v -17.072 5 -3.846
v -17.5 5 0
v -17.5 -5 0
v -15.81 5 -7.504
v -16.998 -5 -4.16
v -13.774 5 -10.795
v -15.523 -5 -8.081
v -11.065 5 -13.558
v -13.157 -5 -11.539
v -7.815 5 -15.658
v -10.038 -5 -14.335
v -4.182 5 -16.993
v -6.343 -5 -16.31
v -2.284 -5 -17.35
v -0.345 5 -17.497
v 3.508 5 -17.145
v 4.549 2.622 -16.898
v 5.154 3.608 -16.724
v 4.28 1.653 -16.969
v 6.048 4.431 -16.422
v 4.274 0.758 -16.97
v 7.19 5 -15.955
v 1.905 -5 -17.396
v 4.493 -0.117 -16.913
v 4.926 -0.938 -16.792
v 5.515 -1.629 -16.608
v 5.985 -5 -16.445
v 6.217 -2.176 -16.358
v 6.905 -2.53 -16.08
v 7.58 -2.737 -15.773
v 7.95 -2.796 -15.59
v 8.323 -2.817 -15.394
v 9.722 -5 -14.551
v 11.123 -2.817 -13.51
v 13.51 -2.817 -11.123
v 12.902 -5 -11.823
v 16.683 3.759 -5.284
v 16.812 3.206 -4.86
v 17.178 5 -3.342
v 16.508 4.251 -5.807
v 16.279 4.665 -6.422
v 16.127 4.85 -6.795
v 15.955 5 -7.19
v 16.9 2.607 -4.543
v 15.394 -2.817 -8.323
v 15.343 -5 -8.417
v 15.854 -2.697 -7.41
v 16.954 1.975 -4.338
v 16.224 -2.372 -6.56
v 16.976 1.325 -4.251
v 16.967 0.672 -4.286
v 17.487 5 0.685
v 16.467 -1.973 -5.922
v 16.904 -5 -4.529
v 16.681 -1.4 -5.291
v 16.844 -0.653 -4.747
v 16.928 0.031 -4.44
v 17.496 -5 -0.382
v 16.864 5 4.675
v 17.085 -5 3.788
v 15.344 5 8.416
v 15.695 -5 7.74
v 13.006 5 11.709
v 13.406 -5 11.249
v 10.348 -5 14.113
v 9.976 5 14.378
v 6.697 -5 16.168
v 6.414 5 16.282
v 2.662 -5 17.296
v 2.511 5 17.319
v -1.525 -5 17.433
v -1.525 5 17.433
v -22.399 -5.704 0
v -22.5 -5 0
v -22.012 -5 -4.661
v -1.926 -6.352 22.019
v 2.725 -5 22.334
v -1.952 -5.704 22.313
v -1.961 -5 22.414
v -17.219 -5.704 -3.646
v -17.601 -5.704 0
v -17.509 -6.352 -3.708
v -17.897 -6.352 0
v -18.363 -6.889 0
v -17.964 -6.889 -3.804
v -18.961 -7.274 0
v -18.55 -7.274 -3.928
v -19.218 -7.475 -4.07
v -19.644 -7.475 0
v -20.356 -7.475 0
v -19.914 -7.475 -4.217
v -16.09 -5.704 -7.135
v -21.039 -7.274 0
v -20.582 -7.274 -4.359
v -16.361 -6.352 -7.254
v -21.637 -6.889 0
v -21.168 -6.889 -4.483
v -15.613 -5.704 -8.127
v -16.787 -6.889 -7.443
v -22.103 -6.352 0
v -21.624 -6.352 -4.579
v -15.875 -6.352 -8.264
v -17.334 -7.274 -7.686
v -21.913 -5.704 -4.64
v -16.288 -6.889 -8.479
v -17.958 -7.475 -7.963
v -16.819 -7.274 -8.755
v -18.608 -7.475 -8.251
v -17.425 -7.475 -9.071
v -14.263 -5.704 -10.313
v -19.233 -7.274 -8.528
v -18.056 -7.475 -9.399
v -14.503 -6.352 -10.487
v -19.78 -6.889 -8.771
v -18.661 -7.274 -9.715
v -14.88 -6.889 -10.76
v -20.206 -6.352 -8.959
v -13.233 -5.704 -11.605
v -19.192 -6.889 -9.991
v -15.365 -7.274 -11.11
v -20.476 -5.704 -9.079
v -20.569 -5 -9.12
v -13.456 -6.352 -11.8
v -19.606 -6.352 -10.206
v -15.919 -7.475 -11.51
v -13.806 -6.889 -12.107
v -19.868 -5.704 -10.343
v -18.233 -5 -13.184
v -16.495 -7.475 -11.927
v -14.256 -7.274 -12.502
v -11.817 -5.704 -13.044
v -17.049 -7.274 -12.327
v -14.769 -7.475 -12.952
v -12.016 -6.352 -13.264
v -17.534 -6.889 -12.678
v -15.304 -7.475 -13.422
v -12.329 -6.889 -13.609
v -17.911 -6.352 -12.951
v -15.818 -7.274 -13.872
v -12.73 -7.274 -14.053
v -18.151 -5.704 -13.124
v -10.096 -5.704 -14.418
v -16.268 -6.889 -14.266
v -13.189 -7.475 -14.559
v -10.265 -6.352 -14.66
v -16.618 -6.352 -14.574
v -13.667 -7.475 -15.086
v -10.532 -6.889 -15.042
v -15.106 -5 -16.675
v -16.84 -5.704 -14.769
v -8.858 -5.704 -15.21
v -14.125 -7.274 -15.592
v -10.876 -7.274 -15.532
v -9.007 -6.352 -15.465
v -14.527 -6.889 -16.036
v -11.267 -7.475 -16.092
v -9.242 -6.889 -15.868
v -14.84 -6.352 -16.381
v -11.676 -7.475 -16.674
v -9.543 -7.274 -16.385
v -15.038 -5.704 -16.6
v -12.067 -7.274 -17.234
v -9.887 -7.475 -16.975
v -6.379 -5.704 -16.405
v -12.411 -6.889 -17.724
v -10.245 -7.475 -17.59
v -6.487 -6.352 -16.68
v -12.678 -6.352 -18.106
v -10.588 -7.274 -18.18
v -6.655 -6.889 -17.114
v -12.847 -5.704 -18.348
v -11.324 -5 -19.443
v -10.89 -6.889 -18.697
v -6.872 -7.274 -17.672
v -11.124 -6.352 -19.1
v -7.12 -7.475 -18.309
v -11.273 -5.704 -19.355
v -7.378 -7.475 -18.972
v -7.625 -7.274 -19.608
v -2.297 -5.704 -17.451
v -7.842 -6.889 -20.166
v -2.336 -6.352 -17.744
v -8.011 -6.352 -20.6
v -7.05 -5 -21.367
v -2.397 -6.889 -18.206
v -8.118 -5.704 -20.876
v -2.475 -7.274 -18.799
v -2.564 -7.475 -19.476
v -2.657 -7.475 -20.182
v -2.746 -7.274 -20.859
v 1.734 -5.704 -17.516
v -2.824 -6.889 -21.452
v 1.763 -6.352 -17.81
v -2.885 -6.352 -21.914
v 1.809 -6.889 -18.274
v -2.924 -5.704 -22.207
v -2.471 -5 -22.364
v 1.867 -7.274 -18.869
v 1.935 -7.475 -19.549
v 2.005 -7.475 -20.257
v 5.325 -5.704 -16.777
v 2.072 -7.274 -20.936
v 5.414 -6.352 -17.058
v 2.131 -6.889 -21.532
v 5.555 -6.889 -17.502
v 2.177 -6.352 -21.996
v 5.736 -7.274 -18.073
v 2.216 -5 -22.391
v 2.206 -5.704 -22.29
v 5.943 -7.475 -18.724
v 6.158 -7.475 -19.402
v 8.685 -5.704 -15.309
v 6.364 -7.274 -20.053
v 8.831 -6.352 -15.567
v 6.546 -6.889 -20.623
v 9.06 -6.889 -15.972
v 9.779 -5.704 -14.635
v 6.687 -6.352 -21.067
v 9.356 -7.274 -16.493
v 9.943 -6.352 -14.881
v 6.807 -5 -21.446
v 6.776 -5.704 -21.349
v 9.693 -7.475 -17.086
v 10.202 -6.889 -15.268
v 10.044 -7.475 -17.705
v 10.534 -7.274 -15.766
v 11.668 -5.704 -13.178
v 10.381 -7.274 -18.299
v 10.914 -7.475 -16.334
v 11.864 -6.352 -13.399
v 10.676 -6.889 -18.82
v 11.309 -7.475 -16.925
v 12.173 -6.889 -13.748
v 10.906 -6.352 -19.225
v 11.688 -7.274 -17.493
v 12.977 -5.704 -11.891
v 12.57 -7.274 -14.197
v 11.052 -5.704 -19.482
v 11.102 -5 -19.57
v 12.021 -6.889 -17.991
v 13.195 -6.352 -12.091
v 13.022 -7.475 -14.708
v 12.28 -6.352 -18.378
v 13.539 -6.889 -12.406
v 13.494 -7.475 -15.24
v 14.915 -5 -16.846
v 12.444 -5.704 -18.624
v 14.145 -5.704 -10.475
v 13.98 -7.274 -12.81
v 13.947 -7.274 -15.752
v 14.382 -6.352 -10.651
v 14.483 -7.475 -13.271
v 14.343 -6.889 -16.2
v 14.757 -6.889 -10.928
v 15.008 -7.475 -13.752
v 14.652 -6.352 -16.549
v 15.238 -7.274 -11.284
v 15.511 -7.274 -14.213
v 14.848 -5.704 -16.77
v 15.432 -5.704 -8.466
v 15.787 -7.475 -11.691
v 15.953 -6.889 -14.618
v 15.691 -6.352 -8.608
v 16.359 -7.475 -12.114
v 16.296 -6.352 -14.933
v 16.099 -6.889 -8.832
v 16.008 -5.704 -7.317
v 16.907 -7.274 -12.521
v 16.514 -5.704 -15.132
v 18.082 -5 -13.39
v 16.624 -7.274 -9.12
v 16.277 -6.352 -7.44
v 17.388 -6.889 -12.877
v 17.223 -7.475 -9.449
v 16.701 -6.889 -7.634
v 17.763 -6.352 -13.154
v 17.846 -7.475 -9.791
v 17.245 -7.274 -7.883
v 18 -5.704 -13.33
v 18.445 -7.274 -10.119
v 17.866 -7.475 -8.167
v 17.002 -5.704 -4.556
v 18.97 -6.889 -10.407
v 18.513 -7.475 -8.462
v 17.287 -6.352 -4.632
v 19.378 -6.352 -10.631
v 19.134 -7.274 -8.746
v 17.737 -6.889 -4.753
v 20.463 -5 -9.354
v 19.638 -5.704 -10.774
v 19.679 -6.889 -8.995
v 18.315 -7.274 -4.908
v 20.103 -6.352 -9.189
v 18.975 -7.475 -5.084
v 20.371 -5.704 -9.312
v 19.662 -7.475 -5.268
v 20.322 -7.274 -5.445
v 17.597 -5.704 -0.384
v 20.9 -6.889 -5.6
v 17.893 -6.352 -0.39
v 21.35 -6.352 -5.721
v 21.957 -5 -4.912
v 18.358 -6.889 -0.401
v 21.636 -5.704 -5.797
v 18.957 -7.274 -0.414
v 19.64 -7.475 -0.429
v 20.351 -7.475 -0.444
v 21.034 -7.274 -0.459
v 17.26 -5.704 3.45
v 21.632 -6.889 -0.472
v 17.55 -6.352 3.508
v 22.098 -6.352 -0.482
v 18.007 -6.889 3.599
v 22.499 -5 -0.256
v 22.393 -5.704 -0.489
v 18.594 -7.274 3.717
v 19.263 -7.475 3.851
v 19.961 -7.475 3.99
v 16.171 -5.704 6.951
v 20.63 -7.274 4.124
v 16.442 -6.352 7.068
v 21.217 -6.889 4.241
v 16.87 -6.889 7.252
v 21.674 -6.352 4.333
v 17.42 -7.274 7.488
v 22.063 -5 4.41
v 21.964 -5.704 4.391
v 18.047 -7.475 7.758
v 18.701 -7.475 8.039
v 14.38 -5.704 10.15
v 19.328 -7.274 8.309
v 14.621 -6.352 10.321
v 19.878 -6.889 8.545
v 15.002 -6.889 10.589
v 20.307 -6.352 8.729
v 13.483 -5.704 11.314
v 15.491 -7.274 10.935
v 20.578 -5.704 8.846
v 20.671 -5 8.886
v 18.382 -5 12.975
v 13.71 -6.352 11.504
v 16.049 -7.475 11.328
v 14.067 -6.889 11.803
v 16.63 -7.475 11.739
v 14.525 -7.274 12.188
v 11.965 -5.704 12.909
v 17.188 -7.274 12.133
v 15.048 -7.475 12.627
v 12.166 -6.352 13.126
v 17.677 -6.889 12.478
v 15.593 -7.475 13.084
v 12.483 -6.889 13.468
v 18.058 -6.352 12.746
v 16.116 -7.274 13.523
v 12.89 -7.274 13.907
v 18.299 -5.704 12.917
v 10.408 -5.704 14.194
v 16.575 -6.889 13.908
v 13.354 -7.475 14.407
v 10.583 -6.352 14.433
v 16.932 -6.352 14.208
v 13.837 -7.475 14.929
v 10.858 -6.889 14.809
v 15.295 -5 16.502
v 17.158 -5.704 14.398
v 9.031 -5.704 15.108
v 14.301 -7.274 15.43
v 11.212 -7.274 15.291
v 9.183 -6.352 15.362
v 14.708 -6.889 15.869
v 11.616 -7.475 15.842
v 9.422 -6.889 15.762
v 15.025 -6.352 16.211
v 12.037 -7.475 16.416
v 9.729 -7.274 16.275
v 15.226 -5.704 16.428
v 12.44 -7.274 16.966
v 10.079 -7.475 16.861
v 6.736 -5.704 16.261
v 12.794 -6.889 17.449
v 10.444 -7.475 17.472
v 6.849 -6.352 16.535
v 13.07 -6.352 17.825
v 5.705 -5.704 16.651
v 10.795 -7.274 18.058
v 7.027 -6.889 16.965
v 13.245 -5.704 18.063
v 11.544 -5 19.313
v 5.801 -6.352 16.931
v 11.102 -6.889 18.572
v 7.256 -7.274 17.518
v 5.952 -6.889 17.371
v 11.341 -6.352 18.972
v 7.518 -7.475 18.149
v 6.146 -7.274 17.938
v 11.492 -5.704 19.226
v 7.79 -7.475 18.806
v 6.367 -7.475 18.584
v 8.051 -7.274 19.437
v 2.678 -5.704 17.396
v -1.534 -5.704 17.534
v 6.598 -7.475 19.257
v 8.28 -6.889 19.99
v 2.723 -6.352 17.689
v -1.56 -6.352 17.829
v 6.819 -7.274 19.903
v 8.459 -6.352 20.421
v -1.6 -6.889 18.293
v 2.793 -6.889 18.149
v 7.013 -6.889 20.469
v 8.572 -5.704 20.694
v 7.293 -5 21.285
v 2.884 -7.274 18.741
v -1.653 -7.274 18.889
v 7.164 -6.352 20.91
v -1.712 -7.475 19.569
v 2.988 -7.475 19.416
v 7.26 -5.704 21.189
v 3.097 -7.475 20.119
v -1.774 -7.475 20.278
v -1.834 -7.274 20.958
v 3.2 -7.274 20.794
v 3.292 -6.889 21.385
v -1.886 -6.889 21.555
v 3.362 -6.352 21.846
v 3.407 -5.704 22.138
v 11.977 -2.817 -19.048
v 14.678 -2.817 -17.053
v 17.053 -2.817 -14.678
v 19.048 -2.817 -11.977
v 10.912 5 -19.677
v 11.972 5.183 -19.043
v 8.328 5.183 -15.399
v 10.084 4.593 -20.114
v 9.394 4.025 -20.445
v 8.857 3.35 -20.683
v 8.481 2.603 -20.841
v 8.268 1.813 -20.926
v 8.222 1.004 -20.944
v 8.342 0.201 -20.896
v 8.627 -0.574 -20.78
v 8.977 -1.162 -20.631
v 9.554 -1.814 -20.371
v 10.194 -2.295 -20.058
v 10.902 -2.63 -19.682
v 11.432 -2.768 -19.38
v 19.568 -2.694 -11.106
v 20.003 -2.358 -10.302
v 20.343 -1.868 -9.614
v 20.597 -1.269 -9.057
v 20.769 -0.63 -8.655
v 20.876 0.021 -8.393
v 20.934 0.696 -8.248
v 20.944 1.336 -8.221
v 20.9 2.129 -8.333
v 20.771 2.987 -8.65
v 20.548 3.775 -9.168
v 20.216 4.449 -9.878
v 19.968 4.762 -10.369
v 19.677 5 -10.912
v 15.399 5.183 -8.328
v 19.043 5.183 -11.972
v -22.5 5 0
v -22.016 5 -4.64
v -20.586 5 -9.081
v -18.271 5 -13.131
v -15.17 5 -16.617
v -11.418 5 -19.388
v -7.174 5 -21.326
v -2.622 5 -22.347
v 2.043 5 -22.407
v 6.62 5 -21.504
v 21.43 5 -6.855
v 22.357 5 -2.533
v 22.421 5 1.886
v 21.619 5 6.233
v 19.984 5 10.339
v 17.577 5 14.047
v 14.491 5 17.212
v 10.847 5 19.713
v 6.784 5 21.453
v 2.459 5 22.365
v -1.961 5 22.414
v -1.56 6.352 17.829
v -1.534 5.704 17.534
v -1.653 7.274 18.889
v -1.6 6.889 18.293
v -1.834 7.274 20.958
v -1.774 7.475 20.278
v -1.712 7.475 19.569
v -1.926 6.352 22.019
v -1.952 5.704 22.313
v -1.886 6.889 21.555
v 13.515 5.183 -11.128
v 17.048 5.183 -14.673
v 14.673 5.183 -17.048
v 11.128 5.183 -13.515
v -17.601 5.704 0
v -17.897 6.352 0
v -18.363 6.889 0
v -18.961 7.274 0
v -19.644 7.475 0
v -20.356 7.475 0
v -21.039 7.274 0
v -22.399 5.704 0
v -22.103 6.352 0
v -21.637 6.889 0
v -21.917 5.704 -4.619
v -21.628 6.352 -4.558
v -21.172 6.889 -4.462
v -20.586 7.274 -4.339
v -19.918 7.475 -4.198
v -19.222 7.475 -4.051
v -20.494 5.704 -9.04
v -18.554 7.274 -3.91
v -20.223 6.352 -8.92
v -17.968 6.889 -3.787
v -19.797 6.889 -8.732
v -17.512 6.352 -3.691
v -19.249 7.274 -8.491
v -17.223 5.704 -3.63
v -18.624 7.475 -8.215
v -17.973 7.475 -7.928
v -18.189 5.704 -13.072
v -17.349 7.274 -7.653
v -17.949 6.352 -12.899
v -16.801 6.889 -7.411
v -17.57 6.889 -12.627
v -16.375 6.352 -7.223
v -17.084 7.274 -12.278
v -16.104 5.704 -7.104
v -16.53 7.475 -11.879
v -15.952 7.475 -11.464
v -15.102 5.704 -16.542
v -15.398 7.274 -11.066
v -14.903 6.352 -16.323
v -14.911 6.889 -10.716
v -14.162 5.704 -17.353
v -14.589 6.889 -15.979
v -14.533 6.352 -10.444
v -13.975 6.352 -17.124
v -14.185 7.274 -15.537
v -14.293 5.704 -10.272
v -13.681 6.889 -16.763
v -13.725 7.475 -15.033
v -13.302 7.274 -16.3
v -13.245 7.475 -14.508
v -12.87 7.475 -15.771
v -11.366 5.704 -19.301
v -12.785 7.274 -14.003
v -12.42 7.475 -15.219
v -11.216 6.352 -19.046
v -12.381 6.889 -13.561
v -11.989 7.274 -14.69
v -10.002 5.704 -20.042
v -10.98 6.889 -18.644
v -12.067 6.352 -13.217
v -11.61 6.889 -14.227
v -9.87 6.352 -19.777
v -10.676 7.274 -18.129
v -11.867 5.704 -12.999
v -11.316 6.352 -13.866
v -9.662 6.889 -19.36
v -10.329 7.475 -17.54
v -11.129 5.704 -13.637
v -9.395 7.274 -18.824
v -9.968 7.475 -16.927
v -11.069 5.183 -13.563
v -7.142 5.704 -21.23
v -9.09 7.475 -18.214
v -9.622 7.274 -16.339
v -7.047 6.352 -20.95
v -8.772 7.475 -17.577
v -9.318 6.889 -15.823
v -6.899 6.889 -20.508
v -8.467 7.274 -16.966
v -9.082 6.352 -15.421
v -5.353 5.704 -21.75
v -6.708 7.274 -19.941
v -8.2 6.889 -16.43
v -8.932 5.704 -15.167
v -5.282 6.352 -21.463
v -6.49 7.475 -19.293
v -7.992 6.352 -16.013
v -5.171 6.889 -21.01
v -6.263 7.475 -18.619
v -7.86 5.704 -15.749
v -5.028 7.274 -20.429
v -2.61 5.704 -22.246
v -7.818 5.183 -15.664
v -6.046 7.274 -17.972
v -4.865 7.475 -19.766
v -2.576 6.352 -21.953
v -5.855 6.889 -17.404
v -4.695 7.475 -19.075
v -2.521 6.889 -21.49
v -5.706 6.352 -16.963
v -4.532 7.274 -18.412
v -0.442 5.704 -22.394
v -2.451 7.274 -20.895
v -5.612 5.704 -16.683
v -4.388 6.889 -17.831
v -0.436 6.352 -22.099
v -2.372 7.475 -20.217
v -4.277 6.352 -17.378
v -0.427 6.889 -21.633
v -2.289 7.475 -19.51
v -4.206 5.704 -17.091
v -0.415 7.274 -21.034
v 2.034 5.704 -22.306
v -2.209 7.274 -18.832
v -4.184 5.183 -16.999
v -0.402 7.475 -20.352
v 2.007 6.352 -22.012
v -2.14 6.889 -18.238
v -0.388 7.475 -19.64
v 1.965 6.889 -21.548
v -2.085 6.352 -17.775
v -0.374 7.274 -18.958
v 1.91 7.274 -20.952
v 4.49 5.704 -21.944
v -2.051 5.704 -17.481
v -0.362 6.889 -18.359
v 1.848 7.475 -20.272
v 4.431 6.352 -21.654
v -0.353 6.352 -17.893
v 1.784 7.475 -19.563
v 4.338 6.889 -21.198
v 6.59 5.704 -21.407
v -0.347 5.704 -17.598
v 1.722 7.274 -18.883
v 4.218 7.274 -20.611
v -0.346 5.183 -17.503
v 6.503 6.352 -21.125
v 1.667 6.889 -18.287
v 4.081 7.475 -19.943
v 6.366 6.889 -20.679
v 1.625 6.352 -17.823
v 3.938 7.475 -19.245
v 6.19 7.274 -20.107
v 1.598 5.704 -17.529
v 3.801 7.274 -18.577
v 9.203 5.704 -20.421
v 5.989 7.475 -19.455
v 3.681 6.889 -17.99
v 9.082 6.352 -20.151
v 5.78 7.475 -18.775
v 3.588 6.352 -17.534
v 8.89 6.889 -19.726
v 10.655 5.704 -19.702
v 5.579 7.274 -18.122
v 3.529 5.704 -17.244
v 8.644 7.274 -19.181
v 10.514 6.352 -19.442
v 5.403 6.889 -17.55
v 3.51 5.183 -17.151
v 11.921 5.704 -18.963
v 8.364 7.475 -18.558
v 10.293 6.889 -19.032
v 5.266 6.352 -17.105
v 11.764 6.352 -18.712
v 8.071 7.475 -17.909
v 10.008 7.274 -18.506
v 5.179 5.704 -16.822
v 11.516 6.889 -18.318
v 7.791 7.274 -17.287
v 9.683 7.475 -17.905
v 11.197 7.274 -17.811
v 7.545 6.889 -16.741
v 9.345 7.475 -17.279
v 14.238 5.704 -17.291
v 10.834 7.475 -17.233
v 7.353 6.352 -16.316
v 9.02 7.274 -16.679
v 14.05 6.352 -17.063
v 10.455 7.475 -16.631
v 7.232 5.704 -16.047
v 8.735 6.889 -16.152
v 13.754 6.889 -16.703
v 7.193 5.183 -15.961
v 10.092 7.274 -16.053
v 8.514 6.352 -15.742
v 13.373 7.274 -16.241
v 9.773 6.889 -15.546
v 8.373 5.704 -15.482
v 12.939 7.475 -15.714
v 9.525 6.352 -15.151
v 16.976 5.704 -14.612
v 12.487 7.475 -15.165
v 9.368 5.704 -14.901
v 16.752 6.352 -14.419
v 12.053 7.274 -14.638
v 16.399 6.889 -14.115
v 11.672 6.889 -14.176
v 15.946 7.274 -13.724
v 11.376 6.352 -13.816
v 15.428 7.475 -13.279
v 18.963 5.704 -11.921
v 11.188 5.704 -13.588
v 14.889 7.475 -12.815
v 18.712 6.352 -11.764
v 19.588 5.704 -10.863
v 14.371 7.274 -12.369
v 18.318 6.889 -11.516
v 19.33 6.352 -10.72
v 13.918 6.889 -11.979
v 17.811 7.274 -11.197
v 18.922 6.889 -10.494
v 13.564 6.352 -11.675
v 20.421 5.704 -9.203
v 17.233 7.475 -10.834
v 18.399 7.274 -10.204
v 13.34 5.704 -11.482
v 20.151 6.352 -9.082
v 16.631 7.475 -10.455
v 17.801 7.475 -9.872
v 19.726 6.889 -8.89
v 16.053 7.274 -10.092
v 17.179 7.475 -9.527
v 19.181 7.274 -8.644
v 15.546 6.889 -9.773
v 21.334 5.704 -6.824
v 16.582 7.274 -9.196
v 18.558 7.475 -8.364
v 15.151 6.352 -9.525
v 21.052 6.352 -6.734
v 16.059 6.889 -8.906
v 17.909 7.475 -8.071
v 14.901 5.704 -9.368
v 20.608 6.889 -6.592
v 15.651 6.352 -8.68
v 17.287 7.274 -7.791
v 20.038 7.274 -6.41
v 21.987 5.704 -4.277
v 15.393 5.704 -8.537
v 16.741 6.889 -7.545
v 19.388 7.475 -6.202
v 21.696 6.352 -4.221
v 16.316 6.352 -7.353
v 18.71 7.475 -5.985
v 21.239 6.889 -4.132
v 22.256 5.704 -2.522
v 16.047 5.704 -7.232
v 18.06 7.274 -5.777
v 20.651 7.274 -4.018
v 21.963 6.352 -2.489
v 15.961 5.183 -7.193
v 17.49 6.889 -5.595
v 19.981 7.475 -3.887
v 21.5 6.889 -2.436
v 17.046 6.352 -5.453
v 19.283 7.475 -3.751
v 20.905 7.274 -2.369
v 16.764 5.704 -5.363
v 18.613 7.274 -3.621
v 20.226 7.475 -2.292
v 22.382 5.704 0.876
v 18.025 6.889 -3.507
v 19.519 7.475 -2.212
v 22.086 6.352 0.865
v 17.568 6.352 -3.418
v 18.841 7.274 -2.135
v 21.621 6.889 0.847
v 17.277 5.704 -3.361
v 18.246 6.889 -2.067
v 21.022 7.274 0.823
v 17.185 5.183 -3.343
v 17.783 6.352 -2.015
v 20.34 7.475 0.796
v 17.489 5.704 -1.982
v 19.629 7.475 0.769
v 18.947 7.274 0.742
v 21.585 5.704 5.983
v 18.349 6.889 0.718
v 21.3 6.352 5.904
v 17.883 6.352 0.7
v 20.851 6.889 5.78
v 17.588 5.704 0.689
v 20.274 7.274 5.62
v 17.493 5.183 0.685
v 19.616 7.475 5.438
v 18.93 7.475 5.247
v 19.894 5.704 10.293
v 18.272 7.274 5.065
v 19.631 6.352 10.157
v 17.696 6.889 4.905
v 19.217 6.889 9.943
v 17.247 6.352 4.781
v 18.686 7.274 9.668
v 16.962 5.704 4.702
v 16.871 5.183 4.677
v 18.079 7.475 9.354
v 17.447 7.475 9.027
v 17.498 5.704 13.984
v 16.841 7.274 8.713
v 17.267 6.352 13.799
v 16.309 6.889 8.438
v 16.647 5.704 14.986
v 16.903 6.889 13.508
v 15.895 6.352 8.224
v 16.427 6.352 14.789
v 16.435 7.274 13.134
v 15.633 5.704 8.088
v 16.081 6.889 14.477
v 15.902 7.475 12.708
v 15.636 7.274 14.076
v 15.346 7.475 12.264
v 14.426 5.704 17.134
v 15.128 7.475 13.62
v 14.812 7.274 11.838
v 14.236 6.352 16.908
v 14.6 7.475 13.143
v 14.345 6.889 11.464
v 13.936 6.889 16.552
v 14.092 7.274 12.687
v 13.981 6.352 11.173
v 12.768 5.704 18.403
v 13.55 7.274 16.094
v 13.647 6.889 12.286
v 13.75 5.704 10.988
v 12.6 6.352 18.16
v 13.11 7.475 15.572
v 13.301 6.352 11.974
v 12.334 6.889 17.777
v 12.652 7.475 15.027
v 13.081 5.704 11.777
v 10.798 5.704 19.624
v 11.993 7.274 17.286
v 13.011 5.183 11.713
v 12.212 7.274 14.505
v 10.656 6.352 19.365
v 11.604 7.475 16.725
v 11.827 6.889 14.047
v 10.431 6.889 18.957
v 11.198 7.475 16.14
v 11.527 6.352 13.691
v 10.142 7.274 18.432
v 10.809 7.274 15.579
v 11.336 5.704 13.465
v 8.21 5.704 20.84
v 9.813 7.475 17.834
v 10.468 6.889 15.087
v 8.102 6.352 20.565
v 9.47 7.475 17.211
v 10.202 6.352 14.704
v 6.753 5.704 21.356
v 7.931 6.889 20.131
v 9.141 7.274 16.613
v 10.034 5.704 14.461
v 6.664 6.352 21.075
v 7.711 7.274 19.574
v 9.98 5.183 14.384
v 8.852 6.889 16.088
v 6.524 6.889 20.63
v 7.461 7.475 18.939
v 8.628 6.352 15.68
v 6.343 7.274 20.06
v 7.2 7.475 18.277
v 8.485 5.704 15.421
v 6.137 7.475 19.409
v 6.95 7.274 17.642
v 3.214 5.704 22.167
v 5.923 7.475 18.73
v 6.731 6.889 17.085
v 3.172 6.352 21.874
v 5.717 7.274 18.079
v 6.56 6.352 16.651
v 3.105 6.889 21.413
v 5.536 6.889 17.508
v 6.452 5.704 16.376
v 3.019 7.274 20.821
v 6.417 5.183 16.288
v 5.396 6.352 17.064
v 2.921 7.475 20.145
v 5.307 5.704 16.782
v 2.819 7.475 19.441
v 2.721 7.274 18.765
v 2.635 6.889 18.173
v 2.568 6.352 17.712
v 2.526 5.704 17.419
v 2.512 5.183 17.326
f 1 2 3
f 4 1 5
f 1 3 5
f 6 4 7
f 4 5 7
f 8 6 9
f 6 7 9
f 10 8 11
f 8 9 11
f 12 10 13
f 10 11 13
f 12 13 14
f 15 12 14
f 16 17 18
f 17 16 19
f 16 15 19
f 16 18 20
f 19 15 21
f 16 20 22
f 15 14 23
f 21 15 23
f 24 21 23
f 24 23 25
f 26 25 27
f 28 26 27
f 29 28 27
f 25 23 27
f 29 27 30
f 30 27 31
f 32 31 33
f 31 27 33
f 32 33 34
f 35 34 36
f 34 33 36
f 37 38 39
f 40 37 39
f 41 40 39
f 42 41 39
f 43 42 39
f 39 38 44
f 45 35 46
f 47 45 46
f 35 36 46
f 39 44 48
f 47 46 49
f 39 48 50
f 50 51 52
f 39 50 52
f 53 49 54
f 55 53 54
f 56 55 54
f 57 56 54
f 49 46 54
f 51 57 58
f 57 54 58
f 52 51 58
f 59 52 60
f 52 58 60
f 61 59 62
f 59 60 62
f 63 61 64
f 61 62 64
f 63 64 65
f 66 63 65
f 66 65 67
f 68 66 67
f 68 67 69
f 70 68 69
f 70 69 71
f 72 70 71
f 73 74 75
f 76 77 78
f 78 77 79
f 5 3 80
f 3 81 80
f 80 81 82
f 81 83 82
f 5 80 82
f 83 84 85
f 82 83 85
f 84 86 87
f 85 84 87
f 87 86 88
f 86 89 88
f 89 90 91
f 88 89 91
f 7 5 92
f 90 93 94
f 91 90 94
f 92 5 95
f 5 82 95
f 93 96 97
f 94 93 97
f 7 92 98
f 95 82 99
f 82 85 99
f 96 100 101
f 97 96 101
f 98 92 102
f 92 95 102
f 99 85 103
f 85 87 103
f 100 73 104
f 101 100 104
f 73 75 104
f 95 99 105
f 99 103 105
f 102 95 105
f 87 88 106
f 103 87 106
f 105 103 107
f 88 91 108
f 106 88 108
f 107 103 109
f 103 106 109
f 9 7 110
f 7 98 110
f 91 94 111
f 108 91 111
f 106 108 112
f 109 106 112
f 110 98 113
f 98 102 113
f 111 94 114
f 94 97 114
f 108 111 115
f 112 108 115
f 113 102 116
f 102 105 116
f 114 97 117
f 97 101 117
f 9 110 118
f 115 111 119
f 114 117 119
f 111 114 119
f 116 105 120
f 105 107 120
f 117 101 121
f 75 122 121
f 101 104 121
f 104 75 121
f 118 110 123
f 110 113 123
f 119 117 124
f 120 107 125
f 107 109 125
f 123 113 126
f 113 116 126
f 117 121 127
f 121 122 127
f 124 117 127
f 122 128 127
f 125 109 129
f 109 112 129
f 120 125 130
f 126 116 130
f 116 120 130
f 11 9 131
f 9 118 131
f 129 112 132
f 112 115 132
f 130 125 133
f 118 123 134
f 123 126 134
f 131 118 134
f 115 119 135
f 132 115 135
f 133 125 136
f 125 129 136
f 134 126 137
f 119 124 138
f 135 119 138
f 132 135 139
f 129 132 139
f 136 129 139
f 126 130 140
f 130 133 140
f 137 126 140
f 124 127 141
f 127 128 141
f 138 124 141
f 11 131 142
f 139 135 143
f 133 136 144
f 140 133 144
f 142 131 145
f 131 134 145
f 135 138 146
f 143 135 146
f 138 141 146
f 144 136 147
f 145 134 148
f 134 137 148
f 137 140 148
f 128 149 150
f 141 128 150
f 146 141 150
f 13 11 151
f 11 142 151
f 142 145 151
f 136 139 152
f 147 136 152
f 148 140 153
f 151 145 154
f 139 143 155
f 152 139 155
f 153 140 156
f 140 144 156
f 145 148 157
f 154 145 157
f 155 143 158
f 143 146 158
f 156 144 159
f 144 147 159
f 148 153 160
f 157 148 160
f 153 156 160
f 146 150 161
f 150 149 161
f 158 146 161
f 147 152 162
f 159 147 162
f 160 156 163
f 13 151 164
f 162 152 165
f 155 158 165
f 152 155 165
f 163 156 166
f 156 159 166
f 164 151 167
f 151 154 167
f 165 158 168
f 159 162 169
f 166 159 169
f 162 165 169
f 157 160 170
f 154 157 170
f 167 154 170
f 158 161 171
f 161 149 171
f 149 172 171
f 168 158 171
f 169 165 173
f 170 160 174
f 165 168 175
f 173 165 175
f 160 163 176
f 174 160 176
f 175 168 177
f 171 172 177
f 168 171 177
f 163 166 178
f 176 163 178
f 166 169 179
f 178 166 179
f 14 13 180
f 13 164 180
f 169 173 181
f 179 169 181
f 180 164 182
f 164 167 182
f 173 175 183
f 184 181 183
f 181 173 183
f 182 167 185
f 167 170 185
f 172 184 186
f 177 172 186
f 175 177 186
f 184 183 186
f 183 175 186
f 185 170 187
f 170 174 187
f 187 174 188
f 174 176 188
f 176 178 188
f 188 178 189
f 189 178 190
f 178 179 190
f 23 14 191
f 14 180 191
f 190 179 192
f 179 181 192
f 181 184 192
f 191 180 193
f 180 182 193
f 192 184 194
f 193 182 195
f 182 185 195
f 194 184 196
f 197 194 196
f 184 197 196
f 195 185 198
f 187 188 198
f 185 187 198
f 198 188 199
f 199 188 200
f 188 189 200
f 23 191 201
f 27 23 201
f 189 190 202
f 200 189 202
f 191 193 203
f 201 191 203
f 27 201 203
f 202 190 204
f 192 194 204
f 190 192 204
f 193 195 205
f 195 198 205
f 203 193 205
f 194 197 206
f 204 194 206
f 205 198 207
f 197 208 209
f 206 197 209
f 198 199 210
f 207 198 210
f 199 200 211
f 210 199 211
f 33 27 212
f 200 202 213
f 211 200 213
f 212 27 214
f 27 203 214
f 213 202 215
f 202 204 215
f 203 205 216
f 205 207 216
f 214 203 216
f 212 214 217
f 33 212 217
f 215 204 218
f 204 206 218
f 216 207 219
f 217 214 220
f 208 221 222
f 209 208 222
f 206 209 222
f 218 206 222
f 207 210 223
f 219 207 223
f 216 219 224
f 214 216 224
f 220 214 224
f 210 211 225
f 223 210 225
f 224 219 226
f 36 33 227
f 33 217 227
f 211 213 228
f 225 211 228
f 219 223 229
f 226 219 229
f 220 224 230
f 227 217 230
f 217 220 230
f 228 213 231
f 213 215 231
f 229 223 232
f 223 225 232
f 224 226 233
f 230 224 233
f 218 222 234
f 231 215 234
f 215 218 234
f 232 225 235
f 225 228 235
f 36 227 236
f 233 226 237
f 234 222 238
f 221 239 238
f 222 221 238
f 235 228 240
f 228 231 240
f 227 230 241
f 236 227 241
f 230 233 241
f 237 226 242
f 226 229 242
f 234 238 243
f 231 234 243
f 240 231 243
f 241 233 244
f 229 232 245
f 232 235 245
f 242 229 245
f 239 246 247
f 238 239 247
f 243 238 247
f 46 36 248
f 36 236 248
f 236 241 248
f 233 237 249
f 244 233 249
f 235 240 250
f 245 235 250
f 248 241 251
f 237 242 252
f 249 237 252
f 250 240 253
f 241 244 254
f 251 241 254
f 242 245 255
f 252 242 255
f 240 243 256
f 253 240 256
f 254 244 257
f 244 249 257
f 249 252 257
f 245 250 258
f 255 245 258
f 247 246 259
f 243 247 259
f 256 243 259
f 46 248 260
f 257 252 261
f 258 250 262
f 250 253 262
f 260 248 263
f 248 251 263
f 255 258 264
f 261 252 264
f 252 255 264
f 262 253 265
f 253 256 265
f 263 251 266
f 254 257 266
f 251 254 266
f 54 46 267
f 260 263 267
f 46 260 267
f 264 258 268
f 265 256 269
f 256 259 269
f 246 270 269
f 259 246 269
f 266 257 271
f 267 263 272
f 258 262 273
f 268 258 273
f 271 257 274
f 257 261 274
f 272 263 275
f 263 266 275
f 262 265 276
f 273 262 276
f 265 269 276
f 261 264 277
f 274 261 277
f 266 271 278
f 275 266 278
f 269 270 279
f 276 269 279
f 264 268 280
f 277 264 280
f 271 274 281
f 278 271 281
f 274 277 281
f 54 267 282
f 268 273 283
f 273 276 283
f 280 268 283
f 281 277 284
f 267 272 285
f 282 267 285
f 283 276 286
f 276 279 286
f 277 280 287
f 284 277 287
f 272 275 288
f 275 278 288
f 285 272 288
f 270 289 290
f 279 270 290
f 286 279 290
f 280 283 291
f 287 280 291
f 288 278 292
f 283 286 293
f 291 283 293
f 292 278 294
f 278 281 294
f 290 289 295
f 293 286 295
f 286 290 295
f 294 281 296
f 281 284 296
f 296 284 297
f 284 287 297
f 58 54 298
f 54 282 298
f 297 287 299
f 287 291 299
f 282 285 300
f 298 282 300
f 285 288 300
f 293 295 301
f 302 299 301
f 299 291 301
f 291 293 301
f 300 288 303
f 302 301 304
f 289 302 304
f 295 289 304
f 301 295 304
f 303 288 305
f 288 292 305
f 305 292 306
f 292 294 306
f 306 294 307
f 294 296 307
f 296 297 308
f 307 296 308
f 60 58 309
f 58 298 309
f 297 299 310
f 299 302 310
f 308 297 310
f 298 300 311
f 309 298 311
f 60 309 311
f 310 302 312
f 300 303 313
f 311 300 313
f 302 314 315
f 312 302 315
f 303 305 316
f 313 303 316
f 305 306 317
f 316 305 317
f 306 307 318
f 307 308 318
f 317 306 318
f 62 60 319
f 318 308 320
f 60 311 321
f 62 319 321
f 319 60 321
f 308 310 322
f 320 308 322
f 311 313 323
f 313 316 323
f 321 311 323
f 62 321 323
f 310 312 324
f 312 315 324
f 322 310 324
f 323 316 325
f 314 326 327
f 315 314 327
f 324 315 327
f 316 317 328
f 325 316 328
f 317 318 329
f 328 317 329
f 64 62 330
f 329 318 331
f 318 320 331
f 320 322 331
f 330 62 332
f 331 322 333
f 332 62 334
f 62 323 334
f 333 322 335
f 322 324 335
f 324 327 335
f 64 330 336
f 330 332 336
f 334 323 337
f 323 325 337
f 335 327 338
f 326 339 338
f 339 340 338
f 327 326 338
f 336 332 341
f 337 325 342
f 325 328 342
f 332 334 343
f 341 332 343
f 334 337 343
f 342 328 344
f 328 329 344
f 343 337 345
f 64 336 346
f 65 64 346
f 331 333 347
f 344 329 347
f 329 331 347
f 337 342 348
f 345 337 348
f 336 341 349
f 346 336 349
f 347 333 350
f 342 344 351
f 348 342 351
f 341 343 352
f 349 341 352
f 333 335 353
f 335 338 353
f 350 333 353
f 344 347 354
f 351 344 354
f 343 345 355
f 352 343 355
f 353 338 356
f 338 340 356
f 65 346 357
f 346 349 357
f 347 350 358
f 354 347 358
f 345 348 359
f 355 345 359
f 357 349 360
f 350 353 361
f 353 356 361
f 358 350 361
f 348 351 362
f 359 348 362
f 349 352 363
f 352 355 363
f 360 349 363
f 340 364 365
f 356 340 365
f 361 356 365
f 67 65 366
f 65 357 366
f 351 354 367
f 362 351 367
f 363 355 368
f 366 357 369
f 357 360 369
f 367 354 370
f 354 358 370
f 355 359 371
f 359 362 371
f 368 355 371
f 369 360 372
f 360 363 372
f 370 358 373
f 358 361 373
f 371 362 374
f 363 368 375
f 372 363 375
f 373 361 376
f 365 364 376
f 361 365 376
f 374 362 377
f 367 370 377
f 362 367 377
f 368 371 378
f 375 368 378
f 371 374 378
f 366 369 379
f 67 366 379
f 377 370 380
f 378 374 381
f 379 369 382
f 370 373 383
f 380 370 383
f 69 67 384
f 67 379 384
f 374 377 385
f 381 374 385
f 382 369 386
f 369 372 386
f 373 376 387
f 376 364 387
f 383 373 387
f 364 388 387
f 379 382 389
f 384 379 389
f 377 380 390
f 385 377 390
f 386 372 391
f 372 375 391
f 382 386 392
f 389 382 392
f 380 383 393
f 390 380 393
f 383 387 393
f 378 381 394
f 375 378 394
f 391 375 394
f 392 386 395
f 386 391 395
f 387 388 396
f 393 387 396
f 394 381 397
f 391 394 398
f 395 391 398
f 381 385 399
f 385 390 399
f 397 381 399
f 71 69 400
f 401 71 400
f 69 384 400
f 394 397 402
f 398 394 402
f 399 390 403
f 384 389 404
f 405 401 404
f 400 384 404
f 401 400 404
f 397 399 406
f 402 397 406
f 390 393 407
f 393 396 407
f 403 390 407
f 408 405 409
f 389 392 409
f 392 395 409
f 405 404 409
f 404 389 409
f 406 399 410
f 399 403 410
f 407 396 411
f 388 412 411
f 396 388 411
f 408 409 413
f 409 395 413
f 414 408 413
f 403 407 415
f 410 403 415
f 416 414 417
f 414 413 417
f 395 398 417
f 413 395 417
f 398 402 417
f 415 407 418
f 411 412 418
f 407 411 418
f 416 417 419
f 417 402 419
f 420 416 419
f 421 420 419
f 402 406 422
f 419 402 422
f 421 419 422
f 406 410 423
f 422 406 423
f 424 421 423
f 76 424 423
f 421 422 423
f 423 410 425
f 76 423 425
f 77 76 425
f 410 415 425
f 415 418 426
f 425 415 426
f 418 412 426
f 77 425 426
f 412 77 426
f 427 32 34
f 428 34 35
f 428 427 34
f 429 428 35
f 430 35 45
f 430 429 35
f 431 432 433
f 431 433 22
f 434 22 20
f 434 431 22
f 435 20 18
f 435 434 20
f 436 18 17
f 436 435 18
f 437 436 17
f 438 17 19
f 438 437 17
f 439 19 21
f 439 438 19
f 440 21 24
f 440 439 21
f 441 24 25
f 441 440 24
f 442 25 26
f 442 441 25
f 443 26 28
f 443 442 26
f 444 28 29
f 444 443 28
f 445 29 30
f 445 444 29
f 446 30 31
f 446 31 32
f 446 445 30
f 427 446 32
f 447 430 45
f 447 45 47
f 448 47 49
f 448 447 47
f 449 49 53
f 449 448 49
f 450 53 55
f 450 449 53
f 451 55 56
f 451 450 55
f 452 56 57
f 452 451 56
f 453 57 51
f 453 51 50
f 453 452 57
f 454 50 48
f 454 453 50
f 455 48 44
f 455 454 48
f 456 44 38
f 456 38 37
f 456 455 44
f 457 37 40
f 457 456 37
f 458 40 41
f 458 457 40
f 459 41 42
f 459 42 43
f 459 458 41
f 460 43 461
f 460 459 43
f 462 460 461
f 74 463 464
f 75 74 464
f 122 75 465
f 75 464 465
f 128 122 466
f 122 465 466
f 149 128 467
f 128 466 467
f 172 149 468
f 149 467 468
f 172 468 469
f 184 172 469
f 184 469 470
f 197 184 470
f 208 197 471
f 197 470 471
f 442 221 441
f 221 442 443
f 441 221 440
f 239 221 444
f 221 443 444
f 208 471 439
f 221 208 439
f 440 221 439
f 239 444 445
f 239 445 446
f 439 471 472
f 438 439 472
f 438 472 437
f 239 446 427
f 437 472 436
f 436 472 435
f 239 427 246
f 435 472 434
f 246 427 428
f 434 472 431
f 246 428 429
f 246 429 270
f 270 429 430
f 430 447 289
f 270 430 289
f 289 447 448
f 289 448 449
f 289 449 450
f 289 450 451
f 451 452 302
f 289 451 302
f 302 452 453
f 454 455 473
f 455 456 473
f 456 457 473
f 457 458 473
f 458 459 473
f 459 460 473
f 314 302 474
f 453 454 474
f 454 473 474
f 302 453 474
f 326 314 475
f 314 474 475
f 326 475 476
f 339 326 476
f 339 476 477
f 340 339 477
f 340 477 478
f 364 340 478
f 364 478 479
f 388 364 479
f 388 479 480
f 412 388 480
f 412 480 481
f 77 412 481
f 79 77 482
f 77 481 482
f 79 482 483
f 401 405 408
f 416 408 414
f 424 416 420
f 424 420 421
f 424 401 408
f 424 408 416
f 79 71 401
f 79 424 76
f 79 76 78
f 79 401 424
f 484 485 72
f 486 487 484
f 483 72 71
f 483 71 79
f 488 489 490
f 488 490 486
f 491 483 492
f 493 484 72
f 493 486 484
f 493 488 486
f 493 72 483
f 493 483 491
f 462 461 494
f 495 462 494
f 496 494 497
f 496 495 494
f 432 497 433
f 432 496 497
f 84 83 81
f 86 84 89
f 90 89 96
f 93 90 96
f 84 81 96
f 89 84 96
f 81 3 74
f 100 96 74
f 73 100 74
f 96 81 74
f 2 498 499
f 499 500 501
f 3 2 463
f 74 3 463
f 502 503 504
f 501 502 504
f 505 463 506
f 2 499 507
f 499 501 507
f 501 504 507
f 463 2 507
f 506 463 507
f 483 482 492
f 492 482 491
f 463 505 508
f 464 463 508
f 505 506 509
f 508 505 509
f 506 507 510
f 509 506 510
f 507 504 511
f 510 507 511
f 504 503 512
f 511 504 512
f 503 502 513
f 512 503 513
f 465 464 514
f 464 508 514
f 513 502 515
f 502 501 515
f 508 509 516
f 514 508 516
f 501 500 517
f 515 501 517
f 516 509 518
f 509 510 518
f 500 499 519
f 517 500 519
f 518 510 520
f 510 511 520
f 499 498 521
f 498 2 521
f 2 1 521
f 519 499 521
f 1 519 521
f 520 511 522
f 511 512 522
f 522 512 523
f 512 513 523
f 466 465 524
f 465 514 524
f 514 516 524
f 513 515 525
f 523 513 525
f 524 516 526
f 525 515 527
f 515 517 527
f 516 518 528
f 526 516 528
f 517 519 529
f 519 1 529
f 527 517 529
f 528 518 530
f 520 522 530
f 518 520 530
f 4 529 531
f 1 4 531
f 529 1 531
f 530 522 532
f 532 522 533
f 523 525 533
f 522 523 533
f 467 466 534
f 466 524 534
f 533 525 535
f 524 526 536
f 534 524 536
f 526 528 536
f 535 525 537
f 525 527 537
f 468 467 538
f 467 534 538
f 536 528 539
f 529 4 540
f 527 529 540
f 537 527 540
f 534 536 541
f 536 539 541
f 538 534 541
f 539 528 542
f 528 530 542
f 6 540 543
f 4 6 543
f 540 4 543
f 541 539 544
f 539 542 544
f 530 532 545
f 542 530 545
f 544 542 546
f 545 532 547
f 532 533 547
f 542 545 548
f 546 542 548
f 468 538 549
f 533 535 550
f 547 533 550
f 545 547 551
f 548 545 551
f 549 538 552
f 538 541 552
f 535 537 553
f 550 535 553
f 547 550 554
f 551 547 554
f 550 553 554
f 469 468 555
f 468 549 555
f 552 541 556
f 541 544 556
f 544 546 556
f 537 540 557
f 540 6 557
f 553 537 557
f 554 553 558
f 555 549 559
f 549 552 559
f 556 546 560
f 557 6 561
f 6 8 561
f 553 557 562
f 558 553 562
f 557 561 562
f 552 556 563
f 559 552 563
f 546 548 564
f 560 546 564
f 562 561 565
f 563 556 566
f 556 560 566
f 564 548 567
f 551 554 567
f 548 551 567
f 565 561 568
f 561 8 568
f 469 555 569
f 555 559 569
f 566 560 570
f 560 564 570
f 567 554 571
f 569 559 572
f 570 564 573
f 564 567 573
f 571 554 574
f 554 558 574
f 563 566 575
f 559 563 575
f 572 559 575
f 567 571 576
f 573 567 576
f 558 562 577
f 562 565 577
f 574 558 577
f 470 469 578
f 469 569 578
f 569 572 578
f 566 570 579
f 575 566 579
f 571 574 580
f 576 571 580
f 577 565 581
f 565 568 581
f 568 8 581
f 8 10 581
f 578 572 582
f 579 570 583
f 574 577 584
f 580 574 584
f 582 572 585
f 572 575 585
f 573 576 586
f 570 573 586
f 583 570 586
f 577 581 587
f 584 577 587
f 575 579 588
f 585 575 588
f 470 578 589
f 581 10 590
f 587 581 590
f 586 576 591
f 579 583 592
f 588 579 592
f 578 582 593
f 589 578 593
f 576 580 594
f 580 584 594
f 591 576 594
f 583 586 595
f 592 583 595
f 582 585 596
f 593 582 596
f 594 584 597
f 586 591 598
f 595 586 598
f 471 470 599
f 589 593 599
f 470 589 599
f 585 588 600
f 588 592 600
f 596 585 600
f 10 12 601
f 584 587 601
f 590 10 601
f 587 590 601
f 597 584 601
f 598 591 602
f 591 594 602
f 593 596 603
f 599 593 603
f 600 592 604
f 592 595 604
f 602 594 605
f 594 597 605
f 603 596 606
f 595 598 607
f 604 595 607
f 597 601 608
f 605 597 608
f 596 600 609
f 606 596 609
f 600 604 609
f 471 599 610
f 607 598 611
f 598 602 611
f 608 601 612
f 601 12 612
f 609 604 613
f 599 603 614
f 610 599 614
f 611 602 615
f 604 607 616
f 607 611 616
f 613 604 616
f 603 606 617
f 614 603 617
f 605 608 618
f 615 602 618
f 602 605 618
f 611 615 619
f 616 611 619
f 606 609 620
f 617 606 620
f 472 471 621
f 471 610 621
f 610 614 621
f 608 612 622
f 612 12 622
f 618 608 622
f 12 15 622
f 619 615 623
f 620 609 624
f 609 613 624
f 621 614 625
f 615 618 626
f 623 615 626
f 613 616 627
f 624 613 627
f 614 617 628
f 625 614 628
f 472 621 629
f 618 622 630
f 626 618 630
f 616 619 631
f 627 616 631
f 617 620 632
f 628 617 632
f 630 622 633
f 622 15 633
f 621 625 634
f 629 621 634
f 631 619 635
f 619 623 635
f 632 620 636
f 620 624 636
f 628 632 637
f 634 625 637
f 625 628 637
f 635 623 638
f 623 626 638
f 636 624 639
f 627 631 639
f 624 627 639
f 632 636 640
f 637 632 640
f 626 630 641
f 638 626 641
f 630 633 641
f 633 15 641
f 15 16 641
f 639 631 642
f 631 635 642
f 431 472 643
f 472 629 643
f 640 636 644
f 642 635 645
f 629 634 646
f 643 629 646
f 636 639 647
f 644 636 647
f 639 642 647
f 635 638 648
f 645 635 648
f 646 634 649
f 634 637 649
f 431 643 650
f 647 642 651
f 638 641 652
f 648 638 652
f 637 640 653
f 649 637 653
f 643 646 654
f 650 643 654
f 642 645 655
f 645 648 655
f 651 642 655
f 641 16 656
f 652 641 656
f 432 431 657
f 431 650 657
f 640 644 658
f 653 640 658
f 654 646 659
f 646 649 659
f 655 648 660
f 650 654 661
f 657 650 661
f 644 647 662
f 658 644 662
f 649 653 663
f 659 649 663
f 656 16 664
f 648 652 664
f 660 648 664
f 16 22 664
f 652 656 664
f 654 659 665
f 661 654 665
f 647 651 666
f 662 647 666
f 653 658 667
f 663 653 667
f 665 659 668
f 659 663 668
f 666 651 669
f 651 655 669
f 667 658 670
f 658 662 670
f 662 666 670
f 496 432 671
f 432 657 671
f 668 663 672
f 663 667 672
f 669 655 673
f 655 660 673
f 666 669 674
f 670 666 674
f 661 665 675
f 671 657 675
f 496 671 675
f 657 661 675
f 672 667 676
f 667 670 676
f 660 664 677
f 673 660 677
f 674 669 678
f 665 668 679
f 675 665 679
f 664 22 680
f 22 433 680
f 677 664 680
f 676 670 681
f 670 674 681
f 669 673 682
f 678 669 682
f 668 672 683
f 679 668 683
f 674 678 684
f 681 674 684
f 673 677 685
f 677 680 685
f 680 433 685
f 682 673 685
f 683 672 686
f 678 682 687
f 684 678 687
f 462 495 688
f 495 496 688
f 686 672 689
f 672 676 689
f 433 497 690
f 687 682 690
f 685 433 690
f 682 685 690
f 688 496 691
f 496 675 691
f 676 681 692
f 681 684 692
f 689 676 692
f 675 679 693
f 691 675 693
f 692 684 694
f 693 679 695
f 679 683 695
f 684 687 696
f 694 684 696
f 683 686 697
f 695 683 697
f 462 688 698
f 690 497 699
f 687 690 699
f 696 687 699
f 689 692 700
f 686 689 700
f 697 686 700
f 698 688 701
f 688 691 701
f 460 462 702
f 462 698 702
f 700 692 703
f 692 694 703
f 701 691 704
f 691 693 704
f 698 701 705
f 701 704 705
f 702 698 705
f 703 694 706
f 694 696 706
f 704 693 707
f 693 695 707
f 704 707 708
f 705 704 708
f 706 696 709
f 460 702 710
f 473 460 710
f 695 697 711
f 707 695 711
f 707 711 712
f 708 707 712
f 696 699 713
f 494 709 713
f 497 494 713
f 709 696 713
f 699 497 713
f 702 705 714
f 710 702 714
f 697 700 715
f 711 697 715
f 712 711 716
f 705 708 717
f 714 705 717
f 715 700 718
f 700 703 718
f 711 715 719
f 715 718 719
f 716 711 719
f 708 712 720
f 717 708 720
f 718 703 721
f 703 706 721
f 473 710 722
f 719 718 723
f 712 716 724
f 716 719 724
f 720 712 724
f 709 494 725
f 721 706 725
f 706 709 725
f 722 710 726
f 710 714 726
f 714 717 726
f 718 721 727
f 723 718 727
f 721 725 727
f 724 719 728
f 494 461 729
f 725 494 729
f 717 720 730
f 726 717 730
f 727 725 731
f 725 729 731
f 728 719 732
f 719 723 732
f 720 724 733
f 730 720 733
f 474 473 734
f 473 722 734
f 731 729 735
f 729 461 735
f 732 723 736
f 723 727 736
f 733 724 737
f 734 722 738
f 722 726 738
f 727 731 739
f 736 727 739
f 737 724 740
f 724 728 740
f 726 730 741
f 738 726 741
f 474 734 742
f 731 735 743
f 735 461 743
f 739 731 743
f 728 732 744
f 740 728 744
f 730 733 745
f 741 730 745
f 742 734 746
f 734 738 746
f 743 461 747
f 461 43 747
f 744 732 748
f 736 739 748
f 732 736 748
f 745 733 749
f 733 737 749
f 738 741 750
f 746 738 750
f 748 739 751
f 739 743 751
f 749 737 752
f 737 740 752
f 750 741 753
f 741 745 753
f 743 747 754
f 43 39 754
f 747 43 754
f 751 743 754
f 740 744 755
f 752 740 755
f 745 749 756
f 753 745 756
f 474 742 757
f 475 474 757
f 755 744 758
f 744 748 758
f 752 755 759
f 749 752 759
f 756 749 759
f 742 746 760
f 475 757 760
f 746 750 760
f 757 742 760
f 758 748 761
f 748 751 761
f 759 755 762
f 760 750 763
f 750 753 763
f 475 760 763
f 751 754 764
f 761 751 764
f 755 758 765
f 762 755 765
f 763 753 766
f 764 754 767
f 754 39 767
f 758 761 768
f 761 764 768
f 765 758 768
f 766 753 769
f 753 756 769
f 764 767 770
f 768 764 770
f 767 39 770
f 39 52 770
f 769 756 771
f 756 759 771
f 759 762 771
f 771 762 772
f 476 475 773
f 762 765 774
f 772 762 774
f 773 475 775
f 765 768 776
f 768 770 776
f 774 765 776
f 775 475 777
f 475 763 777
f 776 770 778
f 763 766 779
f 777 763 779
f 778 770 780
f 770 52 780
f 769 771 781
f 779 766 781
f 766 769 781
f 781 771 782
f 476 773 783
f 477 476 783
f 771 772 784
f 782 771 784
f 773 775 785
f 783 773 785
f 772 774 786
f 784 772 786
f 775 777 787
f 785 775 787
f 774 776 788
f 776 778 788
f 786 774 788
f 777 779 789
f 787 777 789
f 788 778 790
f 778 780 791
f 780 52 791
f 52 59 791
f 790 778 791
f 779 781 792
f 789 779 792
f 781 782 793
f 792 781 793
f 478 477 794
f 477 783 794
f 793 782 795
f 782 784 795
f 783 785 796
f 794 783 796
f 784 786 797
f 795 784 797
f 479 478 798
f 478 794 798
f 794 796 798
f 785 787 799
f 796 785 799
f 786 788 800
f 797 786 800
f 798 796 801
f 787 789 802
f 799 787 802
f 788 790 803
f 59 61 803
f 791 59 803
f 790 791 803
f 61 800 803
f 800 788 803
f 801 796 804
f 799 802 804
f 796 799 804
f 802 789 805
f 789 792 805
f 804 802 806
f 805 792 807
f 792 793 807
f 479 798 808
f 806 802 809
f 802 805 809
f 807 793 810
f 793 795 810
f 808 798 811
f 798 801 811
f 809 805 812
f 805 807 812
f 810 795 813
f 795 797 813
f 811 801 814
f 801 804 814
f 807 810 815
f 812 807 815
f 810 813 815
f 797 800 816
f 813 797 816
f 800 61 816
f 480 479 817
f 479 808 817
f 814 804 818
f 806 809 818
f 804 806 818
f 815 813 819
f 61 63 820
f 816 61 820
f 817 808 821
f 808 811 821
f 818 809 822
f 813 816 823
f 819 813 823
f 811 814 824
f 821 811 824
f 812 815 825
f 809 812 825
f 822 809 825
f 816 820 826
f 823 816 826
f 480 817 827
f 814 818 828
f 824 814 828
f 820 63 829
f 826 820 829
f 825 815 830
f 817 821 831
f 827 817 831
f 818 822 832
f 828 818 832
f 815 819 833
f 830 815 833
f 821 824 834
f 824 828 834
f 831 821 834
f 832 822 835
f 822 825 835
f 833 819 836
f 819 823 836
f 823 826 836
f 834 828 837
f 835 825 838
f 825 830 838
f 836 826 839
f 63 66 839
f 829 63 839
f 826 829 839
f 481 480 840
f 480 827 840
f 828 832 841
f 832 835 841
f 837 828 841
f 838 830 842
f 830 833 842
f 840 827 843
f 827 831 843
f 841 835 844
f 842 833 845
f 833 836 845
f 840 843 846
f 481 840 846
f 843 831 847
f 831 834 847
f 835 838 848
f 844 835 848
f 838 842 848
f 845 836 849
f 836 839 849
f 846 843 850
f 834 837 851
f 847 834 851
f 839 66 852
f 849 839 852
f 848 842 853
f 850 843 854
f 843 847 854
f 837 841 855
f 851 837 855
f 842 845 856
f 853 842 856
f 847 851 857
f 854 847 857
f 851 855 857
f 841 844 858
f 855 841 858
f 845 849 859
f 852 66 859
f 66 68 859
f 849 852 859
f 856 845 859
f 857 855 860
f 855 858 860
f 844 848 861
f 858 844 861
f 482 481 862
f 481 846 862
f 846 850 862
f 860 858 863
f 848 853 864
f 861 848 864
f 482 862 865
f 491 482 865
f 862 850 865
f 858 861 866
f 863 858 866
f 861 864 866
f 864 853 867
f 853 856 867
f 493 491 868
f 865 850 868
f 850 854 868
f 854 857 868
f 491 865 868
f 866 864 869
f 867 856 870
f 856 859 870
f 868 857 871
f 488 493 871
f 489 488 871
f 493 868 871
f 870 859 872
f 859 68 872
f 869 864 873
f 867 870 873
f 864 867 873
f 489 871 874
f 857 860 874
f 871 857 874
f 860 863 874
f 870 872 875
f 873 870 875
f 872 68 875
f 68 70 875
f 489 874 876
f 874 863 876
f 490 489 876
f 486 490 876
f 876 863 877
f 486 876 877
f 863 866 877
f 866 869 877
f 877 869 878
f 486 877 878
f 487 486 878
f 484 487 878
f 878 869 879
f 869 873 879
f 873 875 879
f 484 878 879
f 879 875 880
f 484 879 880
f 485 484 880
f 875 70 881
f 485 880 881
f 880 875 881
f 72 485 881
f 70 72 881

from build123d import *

# Parameters (mm, degrees)
REVOLVE1_ANGLE     = 275
CUT_EXTRUDE1_REACH = 64.273


with BuildPart() as part:
    # Sketch1 → Revolve1 (revolve)
    with BuildSketch(Plane.XY):
        with BuildLine():
            Line((-22.5, -5), (-22.5, 5))
            ThreePointArc((-22.5, 5), (-20, 7.5), (-17.5, 5))
            Line((-17.5, 5), (-17.5, -5))
            ThreePointArc((-17.5, -5), (-20, -7.5), (-22.5, -5))
        make_face()
    revolve(axis=Axis((0, 8.757264849, 0), (0, -1, 0)), revolution_arc=REVOLVE1_ANGLE)

    # Sketch2 → Cut-Extrude1 (cut, up to next)
    with BuildSketch(Plane(origin=(21.213203436, 0, -21.213203436), x_dir=(-0.7071067811865488, 0, -0.7071067811865462), z_dir=(0.7071067811865462, 0, -0.7071067811865488)), mode=Mode.PRIVATE) as cut_extrude1_sk1:
        with BuildLine():
            Line((-5, 5.18337521), (5, 5.18337521))
            ThreePointArc((5, 5.18337521), (9, 1.18337521), (5, -2.81662479))
            Line((5, -2.81662479), (-5, -2.81662479))
            ThreePointArc((-5, -2.81662479), (-9, 1.18337521), (-5, 5.18337521))
        make_face()
    cut_extrude1_tool1 = extrude(cut_extrude1_sk1.sketch, amount=-CUT_EXTRUDE1_REACH, mode=Mode.PRIVATE) & part.part
    add(cut_extrude1_tool1.solids().sort_by_distance((21.213203, 1.183375, -21.213203))[0], mode=Mode.SUBTRACT)


solid = part.part
